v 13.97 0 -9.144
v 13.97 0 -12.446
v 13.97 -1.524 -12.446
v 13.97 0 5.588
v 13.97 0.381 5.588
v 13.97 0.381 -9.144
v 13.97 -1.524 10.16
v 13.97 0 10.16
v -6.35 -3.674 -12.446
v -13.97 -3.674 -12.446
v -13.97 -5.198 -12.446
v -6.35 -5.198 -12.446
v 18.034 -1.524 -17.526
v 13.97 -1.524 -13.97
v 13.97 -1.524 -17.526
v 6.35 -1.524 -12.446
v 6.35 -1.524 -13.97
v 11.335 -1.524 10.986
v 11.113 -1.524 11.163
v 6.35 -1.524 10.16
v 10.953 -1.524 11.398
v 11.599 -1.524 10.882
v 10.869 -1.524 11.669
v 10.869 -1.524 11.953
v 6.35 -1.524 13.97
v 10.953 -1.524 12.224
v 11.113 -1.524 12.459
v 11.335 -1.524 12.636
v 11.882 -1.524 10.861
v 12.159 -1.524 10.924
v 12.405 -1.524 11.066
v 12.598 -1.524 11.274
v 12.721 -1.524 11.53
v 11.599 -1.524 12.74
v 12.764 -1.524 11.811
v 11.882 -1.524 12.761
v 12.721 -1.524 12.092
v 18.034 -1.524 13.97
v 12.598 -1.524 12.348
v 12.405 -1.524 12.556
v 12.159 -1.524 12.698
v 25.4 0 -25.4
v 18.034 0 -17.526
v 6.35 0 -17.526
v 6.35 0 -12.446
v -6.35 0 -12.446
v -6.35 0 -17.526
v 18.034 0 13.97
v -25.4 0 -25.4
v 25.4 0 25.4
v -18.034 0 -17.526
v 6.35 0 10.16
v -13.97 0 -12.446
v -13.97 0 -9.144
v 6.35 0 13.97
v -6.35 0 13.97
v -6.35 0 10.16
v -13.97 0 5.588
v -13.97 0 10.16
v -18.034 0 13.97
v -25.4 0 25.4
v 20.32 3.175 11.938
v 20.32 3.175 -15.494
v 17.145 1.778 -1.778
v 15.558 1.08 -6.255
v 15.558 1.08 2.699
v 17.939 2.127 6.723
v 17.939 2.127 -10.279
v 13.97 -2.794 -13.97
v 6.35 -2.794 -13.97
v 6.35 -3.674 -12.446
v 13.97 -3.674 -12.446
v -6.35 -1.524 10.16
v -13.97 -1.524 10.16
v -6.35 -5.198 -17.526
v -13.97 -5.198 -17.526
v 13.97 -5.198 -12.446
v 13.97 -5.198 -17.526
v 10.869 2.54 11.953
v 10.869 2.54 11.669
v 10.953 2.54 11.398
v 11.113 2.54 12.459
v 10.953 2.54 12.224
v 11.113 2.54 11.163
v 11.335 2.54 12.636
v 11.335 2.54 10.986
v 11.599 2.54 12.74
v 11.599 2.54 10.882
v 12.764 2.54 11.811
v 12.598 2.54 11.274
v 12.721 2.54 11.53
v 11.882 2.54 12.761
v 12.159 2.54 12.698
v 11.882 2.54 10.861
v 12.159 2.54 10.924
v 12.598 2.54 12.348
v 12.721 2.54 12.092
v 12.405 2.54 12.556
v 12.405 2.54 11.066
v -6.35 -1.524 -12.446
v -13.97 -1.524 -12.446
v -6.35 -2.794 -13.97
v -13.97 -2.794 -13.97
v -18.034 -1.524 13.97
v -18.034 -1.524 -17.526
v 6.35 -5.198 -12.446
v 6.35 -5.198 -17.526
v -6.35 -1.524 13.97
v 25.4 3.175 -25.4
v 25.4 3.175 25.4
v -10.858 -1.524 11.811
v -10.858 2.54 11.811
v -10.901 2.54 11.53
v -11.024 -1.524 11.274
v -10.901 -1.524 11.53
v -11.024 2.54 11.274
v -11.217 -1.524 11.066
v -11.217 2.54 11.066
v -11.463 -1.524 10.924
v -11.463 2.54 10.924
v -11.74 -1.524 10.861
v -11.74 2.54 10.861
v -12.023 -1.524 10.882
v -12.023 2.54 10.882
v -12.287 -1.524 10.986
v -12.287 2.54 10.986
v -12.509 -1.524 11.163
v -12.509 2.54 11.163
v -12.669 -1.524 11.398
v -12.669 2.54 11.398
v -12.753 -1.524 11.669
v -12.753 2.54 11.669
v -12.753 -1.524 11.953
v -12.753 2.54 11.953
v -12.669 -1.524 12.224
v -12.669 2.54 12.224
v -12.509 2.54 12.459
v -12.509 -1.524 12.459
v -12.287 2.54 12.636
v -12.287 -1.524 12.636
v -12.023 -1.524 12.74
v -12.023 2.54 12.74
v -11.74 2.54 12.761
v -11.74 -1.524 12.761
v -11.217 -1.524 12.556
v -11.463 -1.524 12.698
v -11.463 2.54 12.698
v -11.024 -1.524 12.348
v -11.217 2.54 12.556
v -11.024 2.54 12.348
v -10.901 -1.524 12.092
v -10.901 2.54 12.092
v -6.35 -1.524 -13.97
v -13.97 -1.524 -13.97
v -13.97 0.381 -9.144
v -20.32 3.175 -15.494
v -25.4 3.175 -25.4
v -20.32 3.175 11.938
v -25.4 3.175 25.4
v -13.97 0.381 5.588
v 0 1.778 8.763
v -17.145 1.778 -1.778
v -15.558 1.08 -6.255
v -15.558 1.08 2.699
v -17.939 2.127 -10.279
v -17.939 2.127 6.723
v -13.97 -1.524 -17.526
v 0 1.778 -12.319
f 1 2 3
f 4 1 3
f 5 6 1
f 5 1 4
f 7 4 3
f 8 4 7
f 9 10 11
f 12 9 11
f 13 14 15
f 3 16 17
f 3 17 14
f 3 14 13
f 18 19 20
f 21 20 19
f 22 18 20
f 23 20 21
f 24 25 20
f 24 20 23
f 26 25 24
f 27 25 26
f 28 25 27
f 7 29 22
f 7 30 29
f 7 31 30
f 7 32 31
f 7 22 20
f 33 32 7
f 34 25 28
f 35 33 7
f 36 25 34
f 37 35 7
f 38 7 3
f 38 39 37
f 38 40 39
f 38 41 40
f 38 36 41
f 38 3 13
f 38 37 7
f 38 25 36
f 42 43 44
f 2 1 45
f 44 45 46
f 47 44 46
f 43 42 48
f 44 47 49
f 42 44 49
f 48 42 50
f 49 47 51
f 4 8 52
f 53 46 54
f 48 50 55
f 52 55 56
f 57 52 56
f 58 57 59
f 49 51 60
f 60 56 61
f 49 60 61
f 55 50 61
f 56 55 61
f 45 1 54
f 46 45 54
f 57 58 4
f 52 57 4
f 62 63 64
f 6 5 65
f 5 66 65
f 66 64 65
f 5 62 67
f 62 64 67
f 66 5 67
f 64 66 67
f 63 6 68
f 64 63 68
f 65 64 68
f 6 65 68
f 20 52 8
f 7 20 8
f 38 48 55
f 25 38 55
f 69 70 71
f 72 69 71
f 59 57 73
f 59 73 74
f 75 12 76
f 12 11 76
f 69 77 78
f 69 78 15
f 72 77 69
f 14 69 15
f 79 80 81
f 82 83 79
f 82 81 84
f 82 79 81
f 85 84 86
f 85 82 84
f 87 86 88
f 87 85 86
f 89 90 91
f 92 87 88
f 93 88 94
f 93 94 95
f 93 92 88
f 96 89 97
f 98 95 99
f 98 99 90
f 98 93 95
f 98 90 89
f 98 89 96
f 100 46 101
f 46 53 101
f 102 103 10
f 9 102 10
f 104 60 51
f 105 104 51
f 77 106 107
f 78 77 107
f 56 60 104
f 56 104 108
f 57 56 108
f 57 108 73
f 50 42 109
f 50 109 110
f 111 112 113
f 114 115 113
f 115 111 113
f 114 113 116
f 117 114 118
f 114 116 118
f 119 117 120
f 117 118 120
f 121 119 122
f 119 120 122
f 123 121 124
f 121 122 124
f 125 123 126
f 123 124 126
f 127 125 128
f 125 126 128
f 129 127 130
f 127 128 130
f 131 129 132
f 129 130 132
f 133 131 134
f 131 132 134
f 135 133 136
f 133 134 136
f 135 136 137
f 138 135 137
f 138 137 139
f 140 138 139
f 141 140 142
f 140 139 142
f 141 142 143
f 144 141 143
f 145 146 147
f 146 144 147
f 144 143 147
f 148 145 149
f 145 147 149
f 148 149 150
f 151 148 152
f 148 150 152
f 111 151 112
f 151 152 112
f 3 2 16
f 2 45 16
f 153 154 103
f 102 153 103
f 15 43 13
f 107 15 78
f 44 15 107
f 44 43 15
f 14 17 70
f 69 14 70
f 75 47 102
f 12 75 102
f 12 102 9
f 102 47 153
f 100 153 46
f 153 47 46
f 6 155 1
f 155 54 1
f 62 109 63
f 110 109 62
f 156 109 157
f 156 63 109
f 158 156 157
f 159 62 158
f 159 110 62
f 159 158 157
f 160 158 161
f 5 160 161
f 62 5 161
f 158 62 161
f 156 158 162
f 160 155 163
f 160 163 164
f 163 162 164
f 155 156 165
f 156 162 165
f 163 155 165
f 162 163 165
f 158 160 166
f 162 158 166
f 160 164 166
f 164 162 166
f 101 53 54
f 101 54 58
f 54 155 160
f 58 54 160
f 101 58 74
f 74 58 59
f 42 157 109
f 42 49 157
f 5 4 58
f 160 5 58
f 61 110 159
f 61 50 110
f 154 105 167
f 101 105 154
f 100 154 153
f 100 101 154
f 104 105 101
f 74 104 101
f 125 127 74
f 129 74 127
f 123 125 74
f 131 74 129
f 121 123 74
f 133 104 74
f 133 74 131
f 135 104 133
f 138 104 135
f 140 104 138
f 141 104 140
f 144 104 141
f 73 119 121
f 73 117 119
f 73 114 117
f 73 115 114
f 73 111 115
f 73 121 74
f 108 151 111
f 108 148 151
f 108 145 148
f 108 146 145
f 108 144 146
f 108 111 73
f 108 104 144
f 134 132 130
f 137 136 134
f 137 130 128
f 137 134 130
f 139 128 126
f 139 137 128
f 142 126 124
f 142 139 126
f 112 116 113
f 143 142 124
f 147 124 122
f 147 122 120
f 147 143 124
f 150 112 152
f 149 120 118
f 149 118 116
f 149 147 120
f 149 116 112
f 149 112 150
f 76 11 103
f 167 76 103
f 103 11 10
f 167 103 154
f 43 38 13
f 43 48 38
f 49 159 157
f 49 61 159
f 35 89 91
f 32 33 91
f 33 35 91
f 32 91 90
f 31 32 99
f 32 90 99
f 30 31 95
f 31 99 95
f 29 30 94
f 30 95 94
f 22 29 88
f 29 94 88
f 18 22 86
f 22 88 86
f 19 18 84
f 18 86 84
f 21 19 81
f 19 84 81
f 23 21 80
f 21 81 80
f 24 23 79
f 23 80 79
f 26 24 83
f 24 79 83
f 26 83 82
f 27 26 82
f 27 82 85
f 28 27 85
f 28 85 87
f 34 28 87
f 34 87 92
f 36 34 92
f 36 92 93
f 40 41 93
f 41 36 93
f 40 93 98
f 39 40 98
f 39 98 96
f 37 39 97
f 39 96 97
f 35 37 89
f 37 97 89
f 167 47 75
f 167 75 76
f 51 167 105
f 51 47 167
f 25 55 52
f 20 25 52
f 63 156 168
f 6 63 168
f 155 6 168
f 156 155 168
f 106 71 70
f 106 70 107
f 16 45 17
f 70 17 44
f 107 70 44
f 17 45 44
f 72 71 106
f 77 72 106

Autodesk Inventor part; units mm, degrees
ref_plane "YZ Plane" through (0, 0, 0) normal (1, 0, 0) x (0, 1, 0)
ref_plane "XZ Plane" through (0, 0, 0) normal (0, 1, 0) x (-1, 0, 0)
ref_plane "XY Plane" through (0, 0, 0) normal (0, 0, 1) x (1, 0, 0)
sketch "Sketch1" plane through (0, 0, 0) normal (0, 1, 0) x (-1, 0, 0)
  line L0 (-25.4, 25.4) -> (25.4, 25.4)
  line L1 (25.4, 25.4) -> (25.4, -25.4)
  line L2 (25.4, -25.4) -> (-25.4, -25.4)
  line L3 (-25.4, -25.4) -> (-25.4, 25.4)
  line L4 (-25.4, 25.4) -> (25.4, -25.4) construction
  line L5 (25.4, 25.4) -> (-25.4, -25.4) construction
  point P0 (0, 0)
  dimension "d0" = 50.8
  dimension "d1" = 50.8
extrude "Extrusion1" add sketch "Sketch1" along normal blind 3.175
sketch "Sketch2" plane through (0, 0, 0) normal (0, -1, 0) x (1, 0, 0)
  line L0 (-11.811, 11.811) -> (11.811, 11.811) construction
  line L1 (11.811, 11.811) -> (11.811, -11.811) construction
  line L2 (11.811, -11.811) -> (-11.811, -11.811) construction
  line L3 (-11.811, -11.811) -> (-11.811, 11.811) construction
  circle A0 centre (-11.811, 11.811) radius 0.9525
  line L4 (13.97, 13.97) -> (-13.97, 13.97) construction
  line L5 (-13.97, 13.97) -> (-13.97, -13.97) construction
  line L6 (-13.97, -13.97) -> (13.97, -13.97) construction
  line L7 (13.97, -13.97) -> (13.97, 13.97) construction
  line L8 (13.97, 13.97) -> (6.35, 13.97)
  line L9 (6.35, 13.97) -> (6.35, 10.16)
  line L10 (6.35, 10.16) -> (13.97, 10.16)
  line L11 (13.97, 10.16) -> (13.97, 13.97)
  line L12 (-13.97, 13.97) -> (-6.35, 13.97)
  line L13 (-6.35, 13.97) -> (-6.35, 10.16)
  line L14 (-6.35, 10.16) -> (-13.97, 10.16)
  line L15 (-13.97, 10.16) -> (-13.97, 13.97)
  circle A1 centre (11.811, 11.811) radius 0.9525
  line L16 (13.97, 13.97) -> (18.034, 13.97)
  line L17 (18.034, 13.97) -> (18.034, -17.526)
  line L18 (18.034, -17.526) -> (13.97, -17.526)
  line L19 (13.97, -17.526) -> (13.97, 13.97)
  line L20 (-13.97, 13.97) -> (-18.034, 13.97)
  line L21 (-18.034, 13.97) -> (-18.034, -17.526)
  line L22 (-18.034, -17.526) -> (-13.97, -17.526)
  line L23 (-13.97, -17.526) -> (-13.97, 13.97)
  point P0 (0, 0)
  point P1 (11.811, 0)
  point P2 (0, 11.811)
  point P3 (0, -13.97)
  point P4 (-13.97, 0)
  point P5 (-13.97, 10.16)
  point P6 (13.97, 10.16)
  dimension "d4" = 23.622
  dimension "d5" = 23.622
  dimension "d27" = 27.94
  dimension "d28" = 27.94
  dimension "d29" = 7.62
  dimension "d30" = 3.81
  dimension "d31" = 1.905
  dimension "d32" = 4.064
  dimension "d33" = 4.064
  dimension "d46" = 31.496
extrude "Extrusion2" add sketch "Sketch2" along normal blind 1.524
sketch "Sketch3" plane through (0, 0, 0) normal (0, -1, 0) x (1, 0, 0)
  line L0 (13.97, 13.97) -> (-13.97, 13.97) construction
  line L1 (-13.97, 13.97) -> (-13.97, -13.97) construction
  line L2 (-13.97, -13.97) -> (13.97, -13.97) construction
  line L3 (13.97, -13.97) -> (13.97, 13.97) construction
  line L4 (13.97, 13.97) -> (-13.97, -13.97) construction
  line L5 (-13.97, 13.97) -> (13.97, -13.97) construction
  line L6 (13.97, 5.588) -> (-13.97, 5.588)
  line L7 (-13.97, 5.588) -> (-13.97, -9.144)
  line L8 (-13.97, -9.144) -> (13.97, -9.144)
  line L9 (13.97, -9.144) -> (13.97, 5.588)
  point P0 (0, 0)
  dimension "d18" = 27.94
  dimension "d19" = 27.94
  dimension "d20" = 4.826
  dimension "d21" = 14.732
sketch "Sketch4" plane through (0, 3.175, 0) normal (0, 1, 0) x (1, 0, 0)
  line L0 (-13.97, 9.144) -> (13.97, 9.144) projected
  line L1 (13.97, -5.588) -> (-13.97, -5.588) projected
  line L2 (-13.97, -5.588) -> (-13.97, 9.144) projected
  line L3 (13.97, 9.144) -> (13.97, -5.588) projected
  line L4 (-20.32, -11.938) -> (20.32, -11.938)
  line L5 (20.32, -11.938) -> (20.32, 15.494)
  line L6 (20.32, 15.494) -> (-20.32, 15.494)
  line L7 (-20.32, 15.494) -> (-20.32, -11.938)
  point P0 (0, 0)
  dimension "d22" = 6.35
sketch "Sketch5" plane through (0, 0, 0) normal (1, 0, 0) x (0, 1, 0)
  line L0 (0, 25.4) -> (0, -25.4) projected
  line L1 (0, -12.446) -> (-1.524, -12.446)
  line L2 (-1.524, 10.16) -> (-1.524, -17.526) projected
  line L3 (-1.524, -12.446) -> (-1.524, -13.97)
  line L4 (-1.524, -13.97) -> (-2.794, -13.97)
  line L5 (-2.794, -13.97) -> (-3.6739, -12.446)
  line L6 (-3.6739, -12.446) -> (-5.1979, -12.446)
  line L7 (-5.1979, -12.446) -> (-5.1979, -17.526)
  line L8 (-5.1979, -17.526) -> (0, -17.526)
  line L9 (0, -17.526) -> (0, -12.446)
  line L10 (3.175, -16.002) -> (3.175, 11.43) projected
  line L11 (0, 13.97) -> (-1.524, 13.97) projected
  point P0 (0, 0)
  point P1 (0, -17.526)
  dimension "d34" = 1.524
  dimension "d35" = 1.524
  dimension "d36" = 1.27
  dimension "d37" = 120
  dimension "d38" = 1.524
  dimension "d39" = 5.08
  dimension "d40" = 27.94
extrude "Extrusion3" add sketch "Sketch5" along normal mid plane 27.94
sketch "Sketch6" plane through (0, 0, 0) normal (0, -1, 0) x (1, 0, 0)
  line L0 (-13.97, -17.526) -> (13.97, -17.526) projected
  line L1 (13.97, -12.446) -> (13.97, -17.526) projected
  line L2 (-13.97, -12.446) -> (13.97, -12.446) projected
  line L3 (-13.97, -17.526) -> (-13.97, -12.446) projected
  line L4 (-6.35, -12.446) -> (6.35, -12.446)
  line L5 (6.35, -12.446) -> (6.35, -17.526)
  line L6 (6.35, -17.526) -> (-6.35, -17.526)
  line L7 (-6.35, -17.526) -> (-6.35, -12.446)
  point P0 (0, 0)
  point P1 (0, -12.446)
  point P2 (0, -12.446)
  dimension "d43" = 12.7
extrude "Extrusion4" cut sketch "Sketch6" along normal up to surface (5.1979 mm away) contours L7 L2 L5 L0
sketch "Sketch7" plane through (0, 0, 0) normal (0, -1, 0) x (1, 0, 0)
  circle A0 centre (11.811, 11.811) radius 0.9525 projected
  circle A1 centre (-11.811, 11.811) radius 0.9525 projected
  point P0 (0, 0)
extrude "Extrusion5" cut sketch "Sketch7" against normal blind 2.54
extrude "Extrusion7" cut sketch "Sketch3" against normal blind 0.381
loft "Loft2" cut profiles "Sketch4" section 1 edges at (-13.97, 0.381, -1.778) (0, 0.381, -9.144) (13.97, 0.381, -1.778) (0, 0.381, 5.588) contours L0 L3 L1 L2 | L7 L6 L5 L4
properties part number "DisplayInsert"
